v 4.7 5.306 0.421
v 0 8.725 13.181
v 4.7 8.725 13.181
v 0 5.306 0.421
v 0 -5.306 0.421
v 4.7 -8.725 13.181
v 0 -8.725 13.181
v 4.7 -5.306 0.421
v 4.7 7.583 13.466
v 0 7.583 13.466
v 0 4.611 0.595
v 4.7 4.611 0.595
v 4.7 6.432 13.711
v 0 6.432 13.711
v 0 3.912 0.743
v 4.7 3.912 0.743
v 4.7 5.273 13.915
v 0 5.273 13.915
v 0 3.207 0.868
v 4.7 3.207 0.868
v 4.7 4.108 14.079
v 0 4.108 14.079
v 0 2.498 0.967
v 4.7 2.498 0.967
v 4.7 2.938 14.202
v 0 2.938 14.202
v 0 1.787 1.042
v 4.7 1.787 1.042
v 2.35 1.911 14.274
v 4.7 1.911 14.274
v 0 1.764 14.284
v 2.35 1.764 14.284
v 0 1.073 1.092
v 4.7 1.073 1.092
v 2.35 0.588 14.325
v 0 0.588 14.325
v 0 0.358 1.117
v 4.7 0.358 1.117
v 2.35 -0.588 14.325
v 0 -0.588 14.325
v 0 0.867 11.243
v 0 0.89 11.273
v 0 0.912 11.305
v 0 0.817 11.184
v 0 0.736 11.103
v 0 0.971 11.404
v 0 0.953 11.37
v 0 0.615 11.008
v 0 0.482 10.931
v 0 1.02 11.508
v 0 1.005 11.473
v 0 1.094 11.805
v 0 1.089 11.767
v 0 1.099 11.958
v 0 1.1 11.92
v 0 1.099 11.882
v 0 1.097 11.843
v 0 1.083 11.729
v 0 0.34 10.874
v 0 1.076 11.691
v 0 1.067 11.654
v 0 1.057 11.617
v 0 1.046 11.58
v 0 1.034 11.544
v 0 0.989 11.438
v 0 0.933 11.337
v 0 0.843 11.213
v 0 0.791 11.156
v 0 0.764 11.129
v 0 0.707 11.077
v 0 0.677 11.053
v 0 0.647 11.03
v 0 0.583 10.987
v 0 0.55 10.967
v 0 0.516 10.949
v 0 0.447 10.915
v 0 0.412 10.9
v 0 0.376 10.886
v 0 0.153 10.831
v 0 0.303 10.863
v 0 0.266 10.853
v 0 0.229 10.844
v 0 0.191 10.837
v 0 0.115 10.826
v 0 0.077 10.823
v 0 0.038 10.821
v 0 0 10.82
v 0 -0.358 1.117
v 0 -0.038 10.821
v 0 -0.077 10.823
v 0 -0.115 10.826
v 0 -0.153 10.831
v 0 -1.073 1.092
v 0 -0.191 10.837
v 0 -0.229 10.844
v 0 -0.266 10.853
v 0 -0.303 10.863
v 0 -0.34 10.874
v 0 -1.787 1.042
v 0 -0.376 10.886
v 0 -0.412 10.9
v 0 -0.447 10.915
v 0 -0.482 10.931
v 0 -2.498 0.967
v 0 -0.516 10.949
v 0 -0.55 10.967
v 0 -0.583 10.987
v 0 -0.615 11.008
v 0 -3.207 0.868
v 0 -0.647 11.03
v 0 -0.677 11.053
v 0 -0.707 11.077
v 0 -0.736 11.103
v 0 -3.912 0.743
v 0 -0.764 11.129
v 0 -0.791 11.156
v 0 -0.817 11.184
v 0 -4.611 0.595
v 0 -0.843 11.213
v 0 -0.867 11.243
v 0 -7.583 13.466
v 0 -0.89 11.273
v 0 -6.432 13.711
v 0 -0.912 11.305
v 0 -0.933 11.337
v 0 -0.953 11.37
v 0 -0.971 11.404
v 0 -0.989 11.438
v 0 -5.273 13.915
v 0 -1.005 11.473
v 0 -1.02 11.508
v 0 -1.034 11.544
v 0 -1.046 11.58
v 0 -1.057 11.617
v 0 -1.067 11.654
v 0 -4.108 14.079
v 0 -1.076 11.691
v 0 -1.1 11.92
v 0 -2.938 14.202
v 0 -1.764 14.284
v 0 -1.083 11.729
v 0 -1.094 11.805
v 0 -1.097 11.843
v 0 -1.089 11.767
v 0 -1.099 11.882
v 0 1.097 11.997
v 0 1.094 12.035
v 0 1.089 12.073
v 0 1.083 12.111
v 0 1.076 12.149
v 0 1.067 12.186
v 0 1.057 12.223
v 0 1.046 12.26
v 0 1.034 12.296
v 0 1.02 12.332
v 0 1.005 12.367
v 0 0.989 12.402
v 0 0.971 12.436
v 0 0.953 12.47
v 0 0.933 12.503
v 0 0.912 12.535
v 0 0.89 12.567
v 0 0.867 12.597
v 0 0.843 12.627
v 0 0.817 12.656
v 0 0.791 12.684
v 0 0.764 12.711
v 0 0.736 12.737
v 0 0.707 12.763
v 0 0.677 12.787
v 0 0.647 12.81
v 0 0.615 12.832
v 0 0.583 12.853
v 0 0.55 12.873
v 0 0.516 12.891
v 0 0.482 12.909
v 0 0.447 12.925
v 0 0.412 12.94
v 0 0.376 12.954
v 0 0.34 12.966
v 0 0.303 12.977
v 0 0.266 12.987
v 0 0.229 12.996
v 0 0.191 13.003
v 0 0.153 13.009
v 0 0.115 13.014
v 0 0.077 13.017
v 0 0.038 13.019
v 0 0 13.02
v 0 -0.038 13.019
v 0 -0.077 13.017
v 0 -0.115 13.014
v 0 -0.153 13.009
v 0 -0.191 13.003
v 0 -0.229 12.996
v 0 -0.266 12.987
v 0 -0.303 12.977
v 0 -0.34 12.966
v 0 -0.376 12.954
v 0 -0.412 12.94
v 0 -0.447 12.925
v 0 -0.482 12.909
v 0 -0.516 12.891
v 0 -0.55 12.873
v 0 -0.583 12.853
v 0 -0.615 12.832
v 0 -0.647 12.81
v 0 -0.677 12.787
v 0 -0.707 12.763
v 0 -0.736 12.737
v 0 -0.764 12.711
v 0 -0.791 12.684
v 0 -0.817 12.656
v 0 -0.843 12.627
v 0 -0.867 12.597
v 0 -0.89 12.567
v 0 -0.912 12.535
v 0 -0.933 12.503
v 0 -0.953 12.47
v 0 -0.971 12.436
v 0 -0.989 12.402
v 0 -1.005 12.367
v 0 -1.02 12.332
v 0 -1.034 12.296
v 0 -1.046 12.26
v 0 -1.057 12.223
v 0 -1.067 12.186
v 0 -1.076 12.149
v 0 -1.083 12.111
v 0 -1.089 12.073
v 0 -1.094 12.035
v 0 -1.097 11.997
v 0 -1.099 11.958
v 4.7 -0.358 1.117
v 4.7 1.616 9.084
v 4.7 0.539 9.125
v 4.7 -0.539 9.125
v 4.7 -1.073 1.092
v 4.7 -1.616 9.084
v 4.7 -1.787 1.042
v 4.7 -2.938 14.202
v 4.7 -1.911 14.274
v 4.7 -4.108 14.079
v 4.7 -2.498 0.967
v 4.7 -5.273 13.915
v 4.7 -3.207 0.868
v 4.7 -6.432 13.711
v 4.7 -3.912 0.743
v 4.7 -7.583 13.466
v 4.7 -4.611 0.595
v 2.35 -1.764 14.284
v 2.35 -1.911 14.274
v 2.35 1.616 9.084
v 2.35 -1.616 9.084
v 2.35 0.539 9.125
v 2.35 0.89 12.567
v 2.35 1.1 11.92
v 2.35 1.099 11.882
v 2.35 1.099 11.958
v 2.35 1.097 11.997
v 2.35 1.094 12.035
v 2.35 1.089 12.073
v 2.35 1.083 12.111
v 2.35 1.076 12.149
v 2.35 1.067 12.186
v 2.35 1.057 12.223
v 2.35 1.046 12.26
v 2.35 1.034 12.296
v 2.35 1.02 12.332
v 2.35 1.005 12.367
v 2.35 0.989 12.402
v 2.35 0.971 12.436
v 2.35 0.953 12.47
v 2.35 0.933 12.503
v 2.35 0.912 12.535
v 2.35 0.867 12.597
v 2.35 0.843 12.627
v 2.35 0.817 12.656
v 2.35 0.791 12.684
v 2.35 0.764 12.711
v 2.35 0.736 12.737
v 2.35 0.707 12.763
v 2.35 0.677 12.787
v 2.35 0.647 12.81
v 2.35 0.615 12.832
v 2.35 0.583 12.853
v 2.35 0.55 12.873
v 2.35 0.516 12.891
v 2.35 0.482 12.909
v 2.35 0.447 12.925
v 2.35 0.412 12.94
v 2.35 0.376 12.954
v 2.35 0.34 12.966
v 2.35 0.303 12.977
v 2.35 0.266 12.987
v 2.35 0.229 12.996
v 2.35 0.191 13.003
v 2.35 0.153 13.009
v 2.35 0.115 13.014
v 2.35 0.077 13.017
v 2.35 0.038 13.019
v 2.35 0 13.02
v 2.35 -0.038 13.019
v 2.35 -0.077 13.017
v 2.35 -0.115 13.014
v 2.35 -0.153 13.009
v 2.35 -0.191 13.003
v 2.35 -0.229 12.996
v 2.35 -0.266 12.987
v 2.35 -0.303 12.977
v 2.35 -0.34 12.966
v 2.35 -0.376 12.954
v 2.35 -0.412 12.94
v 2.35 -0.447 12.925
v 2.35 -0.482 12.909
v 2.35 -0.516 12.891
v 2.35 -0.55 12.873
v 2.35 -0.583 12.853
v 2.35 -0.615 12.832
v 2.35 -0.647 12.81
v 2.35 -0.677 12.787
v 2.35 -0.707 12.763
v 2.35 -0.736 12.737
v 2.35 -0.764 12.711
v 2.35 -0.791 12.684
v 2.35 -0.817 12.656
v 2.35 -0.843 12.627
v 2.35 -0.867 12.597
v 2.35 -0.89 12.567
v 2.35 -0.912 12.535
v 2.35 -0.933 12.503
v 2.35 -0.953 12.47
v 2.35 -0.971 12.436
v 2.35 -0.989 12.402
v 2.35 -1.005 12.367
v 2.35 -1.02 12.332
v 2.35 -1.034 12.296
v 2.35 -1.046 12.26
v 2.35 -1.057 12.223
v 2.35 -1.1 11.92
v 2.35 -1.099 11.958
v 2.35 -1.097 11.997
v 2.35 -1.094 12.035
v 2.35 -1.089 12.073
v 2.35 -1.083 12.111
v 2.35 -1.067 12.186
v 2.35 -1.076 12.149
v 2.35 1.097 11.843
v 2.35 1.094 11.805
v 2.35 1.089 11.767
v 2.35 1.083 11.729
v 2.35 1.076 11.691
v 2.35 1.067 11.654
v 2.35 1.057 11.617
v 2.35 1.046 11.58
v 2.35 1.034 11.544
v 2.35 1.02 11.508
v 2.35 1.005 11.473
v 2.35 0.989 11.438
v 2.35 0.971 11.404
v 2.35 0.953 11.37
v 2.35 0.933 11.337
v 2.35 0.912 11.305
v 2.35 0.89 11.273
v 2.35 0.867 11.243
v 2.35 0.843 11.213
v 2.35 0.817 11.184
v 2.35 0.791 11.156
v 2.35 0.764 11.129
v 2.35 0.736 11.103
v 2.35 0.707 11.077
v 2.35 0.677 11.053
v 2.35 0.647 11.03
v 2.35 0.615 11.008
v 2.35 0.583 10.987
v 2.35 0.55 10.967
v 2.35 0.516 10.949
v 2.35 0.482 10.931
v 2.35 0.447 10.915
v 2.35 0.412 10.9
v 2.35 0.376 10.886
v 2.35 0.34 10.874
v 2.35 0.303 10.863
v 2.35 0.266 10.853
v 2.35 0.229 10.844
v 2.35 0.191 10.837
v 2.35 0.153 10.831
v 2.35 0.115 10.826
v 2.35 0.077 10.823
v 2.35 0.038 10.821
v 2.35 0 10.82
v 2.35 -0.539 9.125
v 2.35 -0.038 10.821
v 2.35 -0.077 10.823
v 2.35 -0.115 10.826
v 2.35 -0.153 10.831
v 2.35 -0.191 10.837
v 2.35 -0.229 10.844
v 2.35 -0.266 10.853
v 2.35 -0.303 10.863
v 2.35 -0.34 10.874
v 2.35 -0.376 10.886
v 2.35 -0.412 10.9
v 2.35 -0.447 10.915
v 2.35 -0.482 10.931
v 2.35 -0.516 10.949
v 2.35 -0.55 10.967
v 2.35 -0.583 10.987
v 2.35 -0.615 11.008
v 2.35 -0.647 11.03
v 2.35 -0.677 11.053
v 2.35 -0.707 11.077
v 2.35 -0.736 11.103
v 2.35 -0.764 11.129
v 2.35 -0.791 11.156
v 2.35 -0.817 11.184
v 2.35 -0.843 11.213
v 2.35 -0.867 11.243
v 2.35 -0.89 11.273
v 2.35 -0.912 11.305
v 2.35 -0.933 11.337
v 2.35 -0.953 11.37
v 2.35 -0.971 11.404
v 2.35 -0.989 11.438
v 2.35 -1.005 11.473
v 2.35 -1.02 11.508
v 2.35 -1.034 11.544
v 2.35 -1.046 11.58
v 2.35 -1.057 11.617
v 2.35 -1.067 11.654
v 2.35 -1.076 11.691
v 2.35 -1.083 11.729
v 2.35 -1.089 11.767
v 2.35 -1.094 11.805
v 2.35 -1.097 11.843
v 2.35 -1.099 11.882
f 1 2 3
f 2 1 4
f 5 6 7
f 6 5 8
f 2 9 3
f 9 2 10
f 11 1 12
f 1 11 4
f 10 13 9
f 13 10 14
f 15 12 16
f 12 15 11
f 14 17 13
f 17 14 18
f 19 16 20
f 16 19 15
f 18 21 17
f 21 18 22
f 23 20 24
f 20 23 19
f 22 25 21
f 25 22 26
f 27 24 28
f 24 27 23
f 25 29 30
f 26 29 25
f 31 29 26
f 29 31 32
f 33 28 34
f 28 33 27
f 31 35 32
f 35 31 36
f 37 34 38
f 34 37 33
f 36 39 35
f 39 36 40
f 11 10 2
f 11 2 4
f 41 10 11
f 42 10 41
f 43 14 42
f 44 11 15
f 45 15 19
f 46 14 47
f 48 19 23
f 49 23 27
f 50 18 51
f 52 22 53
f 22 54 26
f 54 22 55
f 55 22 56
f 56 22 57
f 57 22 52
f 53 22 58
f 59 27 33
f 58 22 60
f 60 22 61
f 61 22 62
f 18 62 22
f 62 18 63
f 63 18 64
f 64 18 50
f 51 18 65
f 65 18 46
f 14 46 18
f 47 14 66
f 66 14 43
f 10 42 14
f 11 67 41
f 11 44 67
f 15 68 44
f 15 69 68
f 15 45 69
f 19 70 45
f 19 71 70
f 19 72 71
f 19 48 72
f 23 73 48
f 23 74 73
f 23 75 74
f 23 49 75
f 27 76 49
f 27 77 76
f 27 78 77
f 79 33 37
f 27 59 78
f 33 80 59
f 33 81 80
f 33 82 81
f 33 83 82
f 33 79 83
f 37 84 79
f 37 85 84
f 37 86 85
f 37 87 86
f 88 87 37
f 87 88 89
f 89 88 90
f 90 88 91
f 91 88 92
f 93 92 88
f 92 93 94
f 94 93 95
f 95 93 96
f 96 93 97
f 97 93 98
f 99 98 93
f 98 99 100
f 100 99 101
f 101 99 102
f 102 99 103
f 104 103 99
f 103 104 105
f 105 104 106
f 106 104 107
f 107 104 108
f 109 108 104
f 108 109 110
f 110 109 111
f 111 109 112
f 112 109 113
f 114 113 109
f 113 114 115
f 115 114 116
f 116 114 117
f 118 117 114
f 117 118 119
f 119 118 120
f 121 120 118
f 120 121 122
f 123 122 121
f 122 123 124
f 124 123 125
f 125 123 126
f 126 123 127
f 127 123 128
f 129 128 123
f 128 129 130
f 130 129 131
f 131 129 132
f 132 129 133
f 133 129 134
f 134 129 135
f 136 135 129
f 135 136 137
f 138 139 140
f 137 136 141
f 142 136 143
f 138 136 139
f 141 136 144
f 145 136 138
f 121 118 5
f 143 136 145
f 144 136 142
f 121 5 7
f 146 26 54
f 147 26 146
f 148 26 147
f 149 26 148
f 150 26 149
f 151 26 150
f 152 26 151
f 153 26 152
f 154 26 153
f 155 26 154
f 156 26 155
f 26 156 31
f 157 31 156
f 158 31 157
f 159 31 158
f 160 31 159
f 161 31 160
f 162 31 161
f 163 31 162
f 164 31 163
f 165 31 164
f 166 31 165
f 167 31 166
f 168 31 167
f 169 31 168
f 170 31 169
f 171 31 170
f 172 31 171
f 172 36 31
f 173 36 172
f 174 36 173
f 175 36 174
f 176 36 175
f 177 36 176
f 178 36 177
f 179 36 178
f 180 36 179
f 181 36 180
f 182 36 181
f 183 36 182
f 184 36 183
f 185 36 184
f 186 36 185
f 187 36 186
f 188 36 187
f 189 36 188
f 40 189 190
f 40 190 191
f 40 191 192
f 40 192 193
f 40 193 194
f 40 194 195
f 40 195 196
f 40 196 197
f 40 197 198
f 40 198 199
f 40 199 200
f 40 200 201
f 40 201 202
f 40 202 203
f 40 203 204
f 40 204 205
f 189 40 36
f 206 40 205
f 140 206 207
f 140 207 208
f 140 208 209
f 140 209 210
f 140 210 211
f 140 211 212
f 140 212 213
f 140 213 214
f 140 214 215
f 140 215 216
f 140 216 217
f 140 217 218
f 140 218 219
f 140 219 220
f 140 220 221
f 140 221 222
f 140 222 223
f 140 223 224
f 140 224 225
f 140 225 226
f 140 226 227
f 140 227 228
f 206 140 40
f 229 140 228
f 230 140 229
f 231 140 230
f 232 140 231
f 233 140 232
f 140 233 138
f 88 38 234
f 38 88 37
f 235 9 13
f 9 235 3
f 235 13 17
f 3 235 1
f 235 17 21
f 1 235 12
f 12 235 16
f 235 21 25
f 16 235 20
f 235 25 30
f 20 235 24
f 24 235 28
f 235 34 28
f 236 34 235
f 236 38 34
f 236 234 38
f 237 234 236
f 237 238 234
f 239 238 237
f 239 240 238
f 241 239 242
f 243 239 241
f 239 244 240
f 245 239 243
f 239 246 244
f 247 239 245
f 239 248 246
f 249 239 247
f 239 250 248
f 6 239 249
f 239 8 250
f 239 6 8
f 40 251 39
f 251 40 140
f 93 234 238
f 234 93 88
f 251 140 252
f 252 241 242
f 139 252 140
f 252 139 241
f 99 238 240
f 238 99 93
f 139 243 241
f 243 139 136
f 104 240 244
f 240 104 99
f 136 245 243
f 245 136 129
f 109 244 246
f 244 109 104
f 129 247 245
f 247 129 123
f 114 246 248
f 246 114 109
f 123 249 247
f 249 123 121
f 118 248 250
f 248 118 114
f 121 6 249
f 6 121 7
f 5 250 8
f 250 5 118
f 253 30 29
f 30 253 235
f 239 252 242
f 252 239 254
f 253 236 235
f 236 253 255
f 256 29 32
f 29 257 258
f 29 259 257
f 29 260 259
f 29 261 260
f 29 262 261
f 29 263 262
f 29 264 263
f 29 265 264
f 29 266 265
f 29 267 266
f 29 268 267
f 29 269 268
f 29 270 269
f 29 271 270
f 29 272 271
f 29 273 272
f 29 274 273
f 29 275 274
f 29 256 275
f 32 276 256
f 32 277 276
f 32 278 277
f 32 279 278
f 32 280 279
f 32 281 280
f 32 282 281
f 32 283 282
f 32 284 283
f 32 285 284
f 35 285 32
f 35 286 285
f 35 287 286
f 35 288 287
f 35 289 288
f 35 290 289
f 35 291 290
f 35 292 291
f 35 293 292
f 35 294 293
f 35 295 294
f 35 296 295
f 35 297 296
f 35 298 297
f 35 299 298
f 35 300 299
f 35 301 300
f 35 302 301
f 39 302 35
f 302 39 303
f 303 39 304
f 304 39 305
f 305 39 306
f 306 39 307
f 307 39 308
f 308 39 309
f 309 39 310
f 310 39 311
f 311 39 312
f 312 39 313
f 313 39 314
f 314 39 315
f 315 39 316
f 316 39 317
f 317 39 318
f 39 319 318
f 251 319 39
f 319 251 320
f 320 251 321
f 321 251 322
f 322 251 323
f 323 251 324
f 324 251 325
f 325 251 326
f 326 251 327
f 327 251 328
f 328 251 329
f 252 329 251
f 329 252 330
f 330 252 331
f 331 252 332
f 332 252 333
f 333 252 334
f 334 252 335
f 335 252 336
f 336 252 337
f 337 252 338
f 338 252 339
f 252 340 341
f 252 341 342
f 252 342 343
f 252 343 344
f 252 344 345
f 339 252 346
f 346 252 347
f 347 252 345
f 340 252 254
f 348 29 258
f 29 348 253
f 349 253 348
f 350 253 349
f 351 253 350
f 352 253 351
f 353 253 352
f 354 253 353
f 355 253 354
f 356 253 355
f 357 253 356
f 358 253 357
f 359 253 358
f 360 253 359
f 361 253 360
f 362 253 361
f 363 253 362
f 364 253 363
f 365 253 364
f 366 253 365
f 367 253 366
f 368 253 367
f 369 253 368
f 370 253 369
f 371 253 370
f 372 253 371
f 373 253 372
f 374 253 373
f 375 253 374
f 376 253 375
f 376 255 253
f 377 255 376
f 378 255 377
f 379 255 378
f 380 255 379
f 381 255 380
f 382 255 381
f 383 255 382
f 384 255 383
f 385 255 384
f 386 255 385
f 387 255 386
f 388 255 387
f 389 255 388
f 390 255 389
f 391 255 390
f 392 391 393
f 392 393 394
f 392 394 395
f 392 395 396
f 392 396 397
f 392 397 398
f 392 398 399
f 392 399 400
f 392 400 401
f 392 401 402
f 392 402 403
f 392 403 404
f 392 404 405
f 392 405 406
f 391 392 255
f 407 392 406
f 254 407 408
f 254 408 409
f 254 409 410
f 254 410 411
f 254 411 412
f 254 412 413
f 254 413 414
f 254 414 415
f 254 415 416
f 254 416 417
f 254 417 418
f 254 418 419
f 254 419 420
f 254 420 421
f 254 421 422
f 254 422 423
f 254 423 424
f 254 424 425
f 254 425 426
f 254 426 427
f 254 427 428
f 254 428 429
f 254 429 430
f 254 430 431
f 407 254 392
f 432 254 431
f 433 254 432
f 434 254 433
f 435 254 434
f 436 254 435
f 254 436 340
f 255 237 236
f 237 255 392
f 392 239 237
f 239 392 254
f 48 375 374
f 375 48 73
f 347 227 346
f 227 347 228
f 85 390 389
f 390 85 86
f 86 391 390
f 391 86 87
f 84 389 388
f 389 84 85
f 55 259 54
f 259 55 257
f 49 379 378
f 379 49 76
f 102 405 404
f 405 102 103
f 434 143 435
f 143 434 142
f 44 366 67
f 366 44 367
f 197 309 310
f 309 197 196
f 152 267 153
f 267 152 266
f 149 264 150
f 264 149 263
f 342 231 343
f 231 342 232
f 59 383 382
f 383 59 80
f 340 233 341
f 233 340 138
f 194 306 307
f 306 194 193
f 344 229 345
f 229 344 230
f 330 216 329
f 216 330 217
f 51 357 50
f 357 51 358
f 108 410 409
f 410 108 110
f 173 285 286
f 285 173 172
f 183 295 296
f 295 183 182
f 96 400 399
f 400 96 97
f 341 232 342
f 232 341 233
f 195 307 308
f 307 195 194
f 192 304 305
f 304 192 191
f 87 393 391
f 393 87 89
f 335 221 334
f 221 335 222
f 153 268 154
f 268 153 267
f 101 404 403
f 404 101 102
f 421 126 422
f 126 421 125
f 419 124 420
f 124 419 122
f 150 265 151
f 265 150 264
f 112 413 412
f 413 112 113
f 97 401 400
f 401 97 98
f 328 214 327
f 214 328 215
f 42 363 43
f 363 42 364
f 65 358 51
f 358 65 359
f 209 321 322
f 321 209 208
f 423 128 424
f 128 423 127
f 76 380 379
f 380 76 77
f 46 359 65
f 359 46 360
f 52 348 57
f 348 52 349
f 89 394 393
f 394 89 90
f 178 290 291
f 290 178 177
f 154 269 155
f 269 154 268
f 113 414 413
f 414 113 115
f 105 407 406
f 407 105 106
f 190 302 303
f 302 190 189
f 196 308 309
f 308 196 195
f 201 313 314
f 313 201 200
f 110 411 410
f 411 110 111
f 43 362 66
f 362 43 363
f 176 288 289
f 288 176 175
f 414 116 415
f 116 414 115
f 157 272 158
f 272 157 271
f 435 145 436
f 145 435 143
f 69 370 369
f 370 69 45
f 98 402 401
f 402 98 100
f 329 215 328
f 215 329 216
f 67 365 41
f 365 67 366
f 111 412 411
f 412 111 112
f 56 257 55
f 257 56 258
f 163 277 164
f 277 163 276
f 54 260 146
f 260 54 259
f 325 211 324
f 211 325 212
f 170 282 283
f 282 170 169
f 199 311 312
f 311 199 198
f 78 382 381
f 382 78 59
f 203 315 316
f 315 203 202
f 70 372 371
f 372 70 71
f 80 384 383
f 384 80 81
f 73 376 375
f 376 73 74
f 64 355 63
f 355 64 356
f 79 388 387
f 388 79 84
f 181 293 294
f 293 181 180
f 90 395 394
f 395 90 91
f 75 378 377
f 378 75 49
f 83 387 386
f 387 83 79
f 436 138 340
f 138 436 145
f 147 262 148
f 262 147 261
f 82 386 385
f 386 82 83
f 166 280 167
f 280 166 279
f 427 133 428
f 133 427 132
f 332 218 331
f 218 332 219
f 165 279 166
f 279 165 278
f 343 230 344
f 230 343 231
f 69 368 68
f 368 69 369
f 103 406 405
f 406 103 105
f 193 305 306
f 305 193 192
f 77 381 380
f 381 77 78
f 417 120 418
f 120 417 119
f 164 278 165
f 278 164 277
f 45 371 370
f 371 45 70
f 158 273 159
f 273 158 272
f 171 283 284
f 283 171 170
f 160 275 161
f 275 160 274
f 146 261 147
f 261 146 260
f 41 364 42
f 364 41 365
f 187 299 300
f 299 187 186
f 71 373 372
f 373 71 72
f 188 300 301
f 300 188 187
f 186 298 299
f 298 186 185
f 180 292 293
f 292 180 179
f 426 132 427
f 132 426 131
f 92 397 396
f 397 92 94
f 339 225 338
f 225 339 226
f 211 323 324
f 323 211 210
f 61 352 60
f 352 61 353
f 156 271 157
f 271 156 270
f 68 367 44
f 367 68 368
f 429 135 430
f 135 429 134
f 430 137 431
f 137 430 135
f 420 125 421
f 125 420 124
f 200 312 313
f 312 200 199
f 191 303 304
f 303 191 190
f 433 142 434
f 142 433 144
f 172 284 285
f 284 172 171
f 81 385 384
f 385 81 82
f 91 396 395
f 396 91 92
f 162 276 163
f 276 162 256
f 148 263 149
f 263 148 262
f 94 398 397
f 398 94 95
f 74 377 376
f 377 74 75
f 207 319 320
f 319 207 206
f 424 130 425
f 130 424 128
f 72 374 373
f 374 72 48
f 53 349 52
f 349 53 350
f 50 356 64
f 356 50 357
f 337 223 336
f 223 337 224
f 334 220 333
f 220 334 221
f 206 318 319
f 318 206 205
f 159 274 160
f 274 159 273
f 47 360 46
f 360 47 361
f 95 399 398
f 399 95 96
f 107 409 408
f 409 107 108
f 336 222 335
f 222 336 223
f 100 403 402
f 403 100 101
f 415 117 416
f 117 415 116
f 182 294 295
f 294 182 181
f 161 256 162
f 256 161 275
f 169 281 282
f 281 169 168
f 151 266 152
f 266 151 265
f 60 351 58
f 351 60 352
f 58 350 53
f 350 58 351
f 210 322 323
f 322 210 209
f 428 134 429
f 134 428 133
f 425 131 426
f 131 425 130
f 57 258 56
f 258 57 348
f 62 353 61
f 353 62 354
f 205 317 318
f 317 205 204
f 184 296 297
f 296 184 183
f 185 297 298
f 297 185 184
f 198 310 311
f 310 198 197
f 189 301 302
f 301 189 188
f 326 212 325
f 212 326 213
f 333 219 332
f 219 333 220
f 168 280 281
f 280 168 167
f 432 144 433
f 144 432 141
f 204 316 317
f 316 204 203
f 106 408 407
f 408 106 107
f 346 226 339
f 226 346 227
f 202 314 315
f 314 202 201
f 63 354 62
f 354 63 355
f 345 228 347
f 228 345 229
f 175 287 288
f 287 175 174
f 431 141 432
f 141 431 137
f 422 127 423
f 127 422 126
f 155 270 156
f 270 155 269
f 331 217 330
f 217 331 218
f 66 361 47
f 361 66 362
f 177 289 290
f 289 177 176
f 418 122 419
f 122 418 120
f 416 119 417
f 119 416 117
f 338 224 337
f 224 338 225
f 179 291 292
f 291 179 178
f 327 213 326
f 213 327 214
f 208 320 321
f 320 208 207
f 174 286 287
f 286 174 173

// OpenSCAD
$fn=180;
eps=0.01;

// Collar dims
collar_rad=7.40/2;

// Detent guide dims
guide_z=19.38;
guide_thick=4.70;
guide_tall=14.21-1;
guide_rad=38-18.5+1;
//
//guide_tall=16.21;
//guide_rad=38-16;
guide_deg=30;
notch_thick=guide_thick+4.10;
notch_tall=99;
notch_rad=49.01-20.5;

notch_deg=6.50;

// Screw hole
hole_x=notch_rad+2.79;
hole_rad=2.20/2;

//sup_wide=23.29;
//sup_tall=1.23;

translate([0, 0, -guide_z]) rotate([0, 90, 0]) difference() {
    union() {
        //translate([-guide_rad-guide_wide, -sup_wide/2, 0]) cube([sup_tall, sup_wide, 14]);
        //cylinder(guide_thick, guide_rad+guide_wide, guide_rad+guide_wide);
        // Guide
        rotate([0, 0, 180-guide_deg/2])
            rotate_extrude(angle=guide_deg)
                translate([guide_rad, 0, 0])
                    square([guide_tall, guide_thick]);
    }
    // Notch
    rotate([0, 0, 180-notch_deg/2]) 
        rotate_extrude(angle=notch_deg)
            translate([notch_rad, guide_thick/2, 0])
                square([notch_tall, notch_thick]);
    //rotate([0, -90, 0]) cylinder(99, collar_rad, collar_rad);
    translate([-hole_x, 0, -eps]) cylinder(99, hole_rad, hole_rad);
    
    // Debug
    //translate([-49, 0, 0]) cube(99);
}

// Debug
//translate([14, 0, 0]) rotate([0, 0, 180]) {
//    include<flaps-knob-pull-guide.scad>;
//}
